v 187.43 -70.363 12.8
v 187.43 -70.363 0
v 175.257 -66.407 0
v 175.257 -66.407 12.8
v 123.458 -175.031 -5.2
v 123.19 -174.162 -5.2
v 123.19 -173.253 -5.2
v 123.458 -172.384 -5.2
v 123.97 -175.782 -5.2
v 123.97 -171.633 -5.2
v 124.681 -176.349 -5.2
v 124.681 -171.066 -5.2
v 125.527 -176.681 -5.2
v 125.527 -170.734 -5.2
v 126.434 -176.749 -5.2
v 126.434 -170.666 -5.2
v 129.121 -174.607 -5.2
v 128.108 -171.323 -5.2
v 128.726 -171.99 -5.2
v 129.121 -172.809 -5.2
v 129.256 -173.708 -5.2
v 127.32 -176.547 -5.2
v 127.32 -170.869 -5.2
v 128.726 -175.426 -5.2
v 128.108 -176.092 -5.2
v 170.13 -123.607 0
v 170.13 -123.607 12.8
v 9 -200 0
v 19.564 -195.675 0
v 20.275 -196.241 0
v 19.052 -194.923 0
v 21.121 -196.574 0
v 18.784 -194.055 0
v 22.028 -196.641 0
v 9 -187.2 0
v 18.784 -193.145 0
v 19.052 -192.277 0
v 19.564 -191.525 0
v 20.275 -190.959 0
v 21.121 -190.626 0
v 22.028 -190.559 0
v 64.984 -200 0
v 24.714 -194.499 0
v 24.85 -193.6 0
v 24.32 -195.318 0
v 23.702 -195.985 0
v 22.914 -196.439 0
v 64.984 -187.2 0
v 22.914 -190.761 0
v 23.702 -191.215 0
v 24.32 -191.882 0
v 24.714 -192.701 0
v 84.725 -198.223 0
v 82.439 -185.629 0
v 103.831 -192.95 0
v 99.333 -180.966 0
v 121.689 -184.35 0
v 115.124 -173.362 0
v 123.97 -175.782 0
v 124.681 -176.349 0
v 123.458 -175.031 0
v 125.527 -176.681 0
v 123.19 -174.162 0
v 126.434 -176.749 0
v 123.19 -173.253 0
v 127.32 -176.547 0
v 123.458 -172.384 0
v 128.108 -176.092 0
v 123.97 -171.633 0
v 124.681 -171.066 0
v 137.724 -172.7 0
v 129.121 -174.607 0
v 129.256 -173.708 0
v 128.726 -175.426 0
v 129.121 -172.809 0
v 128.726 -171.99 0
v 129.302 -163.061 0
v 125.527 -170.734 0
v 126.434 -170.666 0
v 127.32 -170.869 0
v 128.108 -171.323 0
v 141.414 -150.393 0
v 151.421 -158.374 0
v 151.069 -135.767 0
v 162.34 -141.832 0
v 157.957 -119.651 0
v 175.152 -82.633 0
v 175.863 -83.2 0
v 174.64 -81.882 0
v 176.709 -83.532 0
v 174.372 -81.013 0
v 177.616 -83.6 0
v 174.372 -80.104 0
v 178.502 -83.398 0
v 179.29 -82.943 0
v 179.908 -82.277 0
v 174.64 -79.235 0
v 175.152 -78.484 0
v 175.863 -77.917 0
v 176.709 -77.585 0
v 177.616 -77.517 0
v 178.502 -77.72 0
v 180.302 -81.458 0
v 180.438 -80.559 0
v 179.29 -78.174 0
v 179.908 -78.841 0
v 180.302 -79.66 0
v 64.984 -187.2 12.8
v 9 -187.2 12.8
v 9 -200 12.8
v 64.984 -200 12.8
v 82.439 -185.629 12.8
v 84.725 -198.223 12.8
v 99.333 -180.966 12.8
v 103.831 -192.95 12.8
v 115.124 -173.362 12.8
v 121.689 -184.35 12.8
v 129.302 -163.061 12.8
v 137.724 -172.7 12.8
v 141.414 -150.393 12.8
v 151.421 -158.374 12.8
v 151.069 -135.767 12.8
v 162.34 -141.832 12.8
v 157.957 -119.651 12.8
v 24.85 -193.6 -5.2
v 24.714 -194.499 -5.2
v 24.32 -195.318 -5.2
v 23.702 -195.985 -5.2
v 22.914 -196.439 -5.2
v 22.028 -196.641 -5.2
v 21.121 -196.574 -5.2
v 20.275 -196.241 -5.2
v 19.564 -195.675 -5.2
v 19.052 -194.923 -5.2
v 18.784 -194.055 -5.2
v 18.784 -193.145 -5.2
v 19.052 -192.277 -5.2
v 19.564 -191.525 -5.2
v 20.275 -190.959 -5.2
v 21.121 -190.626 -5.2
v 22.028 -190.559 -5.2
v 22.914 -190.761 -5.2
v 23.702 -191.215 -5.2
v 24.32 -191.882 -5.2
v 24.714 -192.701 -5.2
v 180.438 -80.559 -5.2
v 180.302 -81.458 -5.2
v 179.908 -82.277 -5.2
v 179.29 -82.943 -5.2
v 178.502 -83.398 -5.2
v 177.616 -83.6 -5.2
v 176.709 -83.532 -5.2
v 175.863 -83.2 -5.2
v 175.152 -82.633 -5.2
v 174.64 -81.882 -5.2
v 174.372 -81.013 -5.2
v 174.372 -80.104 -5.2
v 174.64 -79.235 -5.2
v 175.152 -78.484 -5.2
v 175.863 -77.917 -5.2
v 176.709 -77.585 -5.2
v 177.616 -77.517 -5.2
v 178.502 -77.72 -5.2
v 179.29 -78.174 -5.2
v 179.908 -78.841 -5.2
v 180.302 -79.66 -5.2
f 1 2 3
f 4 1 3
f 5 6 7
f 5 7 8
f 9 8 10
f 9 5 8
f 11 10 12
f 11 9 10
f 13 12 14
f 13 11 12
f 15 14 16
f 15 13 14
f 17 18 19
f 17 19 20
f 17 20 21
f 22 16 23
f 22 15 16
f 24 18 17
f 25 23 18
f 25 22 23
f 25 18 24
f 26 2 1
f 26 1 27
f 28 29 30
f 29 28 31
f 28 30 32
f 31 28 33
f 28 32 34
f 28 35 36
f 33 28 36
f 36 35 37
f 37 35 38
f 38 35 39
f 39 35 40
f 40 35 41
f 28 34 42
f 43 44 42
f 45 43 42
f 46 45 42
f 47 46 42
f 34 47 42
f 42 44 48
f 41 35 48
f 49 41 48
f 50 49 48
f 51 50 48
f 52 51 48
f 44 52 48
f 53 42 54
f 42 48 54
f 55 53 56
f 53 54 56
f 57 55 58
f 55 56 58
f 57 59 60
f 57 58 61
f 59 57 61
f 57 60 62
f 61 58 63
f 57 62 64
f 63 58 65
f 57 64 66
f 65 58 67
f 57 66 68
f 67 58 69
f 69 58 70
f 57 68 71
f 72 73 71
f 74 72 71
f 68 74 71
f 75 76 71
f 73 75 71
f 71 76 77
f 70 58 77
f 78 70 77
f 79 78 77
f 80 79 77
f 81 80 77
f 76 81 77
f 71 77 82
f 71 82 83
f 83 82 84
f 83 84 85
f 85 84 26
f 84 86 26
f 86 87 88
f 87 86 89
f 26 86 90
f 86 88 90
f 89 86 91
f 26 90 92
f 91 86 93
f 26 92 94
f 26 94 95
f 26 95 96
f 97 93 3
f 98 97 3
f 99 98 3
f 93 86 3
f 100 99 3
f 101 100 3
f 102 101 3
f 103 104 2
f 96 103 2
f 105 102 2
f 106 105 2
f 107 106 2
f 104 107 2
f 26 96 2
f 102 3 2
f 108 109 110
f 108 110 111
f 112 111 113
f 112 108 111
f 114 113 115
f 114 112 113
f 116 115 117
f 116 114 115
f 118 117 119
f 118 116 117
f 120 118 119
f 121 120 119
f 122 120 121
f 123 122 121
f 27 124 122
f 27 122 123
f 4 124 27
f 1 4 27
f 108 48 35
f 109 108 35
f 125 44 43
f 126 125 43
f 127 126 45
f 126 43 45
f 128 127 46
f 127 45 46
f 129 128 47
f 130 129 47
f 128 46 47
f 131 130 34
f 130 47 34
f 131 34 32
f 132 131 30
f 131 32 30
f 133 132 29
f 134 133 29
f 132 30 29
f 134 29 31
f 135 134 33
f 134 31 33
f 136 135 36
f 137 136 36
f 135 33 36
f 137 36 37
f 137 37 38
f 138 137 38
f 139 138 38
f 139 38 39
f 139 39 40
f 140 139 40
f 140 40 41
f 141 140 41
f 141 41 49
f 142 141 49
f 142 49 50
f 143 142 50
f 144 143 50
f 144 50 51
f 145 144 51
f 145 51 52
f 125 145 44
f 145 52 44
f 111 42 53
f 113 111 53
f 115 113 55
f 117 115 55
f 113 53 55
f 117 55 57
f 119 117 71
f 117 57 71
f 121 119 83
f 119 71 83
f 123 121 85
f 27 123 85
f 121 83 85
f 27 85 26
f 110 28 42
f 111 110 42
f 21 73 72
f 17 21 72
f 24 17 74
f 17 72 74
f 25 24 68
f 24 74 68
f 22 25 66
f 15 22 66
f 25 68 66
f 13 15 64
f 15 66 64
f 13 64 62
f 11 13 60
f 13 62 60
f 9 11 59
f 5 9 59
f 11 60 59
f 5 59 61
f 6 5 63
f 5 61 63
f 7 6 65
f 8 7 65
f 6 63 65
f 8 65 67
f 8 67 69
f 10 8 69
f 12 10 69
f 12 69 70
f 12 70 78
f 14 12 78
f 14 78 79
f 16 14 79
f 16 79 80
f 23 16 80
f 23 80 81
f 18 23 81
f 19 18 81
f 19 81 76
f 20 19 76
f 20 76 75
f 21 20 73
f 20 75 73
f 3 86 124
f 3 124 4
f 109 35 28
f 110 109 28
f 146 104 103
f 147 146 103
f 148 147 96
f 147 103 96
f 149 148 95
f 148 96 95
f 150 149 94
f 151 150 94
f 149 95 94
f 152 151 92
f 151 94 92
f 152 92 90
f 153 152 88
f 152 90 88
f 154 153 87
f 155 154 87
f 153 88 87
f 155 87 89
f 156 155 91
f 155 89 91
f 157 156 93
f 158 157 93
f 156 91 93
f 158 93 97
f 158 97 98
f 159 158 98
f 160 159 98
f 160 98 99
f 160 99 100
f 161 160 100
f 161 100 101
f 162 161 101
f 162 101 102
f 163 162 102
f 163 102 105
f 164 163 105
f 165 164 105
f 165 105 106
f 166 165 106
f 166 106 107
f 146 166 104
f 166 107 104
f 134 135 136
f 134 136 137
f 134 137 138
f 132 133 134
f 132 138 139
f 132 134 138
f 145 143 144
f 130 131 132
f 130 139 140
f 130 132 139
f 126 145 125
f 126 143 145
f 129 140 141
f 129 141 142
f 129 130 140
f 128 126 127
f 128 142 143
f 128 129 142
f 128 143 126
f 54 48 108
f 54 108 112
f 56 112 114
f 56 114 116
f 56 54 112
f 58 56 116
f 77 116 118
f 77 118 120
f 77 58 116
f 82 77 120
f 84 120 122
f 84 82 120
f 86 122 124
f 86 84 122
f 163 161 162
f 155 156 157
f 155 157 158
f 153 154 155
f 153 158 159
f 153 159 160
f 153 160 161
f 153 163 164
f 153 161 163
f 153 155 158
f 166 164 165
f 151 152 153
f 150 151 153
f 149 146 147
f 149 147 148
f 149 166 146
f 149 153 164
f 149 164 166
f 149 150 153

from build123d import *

# Parameters (mm, degrees)
PAD007_DEPTH = 12.8
SKETCH026_R  = 3.05
PAD008_DEPTH = 5.2
SKETCH027_R  = 3.05
PAD009_DEPTH = 5.2
SKETCH028_R  = 3.05
PAD010_DEPTH = 5.2


with BuildPart() as part:
    # Sketch025 → Pad007 (new body)
    with BuildSketch(Plane.XY):
        with BuildLine():
            Line((64.9839392466, -187.2), (9, -187.2))
            Line((9, -187.2), (9, -200))
            Line((9, -200), (64.9839392466, -200))
            ThreePointArc((64.9839392466, -200), (129.9678784932, -178.8854382), (170.1301616704, -123.60679775))
            Line((187.4301503097, -70.3629075216), (170.1301616704, -123.60679775))
            Line((187.4301503097, -70.3629075216), (175.2566269011, -66.4074899936))
            Line((157.9566382618, -119.651380222), (175.2566269011, -66.4074899936))
            ThreePointArc((64.9839392466, -187.2), (122.4442272638, -168.530020672), (157.9566382618, -119.651380222))
        make_face()
    extrude(amount=PAD007_DEPTH)

    # Sketch026 (on Face9 of Pad007) → Pad008 (join)
    with BuildSketch(Plane(origin=(0, 0, 0), x_dir=(1, 0, 0), z_dir=(0, 0, -1))):
        with Locations((21.8, 193.6)):
            Circle(SKETCH026_R)
    extrude(amount=PAD008_DEPTH)

    # Sketch027 (on Face4 of Pad008) → Pad009 (join)
    with BuildSketch(Plane(origin=(0, 0, 0), x_dir=(1, 0, 0), z_dir=(0, 0, -1))):
        with Locations((126.2060528785, 173.707729436)):
            Circle(SKETCH027_R)
    extrude(amount=PAD009_DEPTH)

    # Sketch028 (on Face4 of Pad009) → Pad010 (join)
    with BuildSketch(Plane(origin=(0, 0, 0), x_dir=(1, 0, 0), z_dir=(0, 0, -1))):
        with Locations((177.3879710774, 80.5587221662)):
            Circle(SKETCH028_R)
    extrude(amount=PAD010_DEPTH)


solid = part.part
